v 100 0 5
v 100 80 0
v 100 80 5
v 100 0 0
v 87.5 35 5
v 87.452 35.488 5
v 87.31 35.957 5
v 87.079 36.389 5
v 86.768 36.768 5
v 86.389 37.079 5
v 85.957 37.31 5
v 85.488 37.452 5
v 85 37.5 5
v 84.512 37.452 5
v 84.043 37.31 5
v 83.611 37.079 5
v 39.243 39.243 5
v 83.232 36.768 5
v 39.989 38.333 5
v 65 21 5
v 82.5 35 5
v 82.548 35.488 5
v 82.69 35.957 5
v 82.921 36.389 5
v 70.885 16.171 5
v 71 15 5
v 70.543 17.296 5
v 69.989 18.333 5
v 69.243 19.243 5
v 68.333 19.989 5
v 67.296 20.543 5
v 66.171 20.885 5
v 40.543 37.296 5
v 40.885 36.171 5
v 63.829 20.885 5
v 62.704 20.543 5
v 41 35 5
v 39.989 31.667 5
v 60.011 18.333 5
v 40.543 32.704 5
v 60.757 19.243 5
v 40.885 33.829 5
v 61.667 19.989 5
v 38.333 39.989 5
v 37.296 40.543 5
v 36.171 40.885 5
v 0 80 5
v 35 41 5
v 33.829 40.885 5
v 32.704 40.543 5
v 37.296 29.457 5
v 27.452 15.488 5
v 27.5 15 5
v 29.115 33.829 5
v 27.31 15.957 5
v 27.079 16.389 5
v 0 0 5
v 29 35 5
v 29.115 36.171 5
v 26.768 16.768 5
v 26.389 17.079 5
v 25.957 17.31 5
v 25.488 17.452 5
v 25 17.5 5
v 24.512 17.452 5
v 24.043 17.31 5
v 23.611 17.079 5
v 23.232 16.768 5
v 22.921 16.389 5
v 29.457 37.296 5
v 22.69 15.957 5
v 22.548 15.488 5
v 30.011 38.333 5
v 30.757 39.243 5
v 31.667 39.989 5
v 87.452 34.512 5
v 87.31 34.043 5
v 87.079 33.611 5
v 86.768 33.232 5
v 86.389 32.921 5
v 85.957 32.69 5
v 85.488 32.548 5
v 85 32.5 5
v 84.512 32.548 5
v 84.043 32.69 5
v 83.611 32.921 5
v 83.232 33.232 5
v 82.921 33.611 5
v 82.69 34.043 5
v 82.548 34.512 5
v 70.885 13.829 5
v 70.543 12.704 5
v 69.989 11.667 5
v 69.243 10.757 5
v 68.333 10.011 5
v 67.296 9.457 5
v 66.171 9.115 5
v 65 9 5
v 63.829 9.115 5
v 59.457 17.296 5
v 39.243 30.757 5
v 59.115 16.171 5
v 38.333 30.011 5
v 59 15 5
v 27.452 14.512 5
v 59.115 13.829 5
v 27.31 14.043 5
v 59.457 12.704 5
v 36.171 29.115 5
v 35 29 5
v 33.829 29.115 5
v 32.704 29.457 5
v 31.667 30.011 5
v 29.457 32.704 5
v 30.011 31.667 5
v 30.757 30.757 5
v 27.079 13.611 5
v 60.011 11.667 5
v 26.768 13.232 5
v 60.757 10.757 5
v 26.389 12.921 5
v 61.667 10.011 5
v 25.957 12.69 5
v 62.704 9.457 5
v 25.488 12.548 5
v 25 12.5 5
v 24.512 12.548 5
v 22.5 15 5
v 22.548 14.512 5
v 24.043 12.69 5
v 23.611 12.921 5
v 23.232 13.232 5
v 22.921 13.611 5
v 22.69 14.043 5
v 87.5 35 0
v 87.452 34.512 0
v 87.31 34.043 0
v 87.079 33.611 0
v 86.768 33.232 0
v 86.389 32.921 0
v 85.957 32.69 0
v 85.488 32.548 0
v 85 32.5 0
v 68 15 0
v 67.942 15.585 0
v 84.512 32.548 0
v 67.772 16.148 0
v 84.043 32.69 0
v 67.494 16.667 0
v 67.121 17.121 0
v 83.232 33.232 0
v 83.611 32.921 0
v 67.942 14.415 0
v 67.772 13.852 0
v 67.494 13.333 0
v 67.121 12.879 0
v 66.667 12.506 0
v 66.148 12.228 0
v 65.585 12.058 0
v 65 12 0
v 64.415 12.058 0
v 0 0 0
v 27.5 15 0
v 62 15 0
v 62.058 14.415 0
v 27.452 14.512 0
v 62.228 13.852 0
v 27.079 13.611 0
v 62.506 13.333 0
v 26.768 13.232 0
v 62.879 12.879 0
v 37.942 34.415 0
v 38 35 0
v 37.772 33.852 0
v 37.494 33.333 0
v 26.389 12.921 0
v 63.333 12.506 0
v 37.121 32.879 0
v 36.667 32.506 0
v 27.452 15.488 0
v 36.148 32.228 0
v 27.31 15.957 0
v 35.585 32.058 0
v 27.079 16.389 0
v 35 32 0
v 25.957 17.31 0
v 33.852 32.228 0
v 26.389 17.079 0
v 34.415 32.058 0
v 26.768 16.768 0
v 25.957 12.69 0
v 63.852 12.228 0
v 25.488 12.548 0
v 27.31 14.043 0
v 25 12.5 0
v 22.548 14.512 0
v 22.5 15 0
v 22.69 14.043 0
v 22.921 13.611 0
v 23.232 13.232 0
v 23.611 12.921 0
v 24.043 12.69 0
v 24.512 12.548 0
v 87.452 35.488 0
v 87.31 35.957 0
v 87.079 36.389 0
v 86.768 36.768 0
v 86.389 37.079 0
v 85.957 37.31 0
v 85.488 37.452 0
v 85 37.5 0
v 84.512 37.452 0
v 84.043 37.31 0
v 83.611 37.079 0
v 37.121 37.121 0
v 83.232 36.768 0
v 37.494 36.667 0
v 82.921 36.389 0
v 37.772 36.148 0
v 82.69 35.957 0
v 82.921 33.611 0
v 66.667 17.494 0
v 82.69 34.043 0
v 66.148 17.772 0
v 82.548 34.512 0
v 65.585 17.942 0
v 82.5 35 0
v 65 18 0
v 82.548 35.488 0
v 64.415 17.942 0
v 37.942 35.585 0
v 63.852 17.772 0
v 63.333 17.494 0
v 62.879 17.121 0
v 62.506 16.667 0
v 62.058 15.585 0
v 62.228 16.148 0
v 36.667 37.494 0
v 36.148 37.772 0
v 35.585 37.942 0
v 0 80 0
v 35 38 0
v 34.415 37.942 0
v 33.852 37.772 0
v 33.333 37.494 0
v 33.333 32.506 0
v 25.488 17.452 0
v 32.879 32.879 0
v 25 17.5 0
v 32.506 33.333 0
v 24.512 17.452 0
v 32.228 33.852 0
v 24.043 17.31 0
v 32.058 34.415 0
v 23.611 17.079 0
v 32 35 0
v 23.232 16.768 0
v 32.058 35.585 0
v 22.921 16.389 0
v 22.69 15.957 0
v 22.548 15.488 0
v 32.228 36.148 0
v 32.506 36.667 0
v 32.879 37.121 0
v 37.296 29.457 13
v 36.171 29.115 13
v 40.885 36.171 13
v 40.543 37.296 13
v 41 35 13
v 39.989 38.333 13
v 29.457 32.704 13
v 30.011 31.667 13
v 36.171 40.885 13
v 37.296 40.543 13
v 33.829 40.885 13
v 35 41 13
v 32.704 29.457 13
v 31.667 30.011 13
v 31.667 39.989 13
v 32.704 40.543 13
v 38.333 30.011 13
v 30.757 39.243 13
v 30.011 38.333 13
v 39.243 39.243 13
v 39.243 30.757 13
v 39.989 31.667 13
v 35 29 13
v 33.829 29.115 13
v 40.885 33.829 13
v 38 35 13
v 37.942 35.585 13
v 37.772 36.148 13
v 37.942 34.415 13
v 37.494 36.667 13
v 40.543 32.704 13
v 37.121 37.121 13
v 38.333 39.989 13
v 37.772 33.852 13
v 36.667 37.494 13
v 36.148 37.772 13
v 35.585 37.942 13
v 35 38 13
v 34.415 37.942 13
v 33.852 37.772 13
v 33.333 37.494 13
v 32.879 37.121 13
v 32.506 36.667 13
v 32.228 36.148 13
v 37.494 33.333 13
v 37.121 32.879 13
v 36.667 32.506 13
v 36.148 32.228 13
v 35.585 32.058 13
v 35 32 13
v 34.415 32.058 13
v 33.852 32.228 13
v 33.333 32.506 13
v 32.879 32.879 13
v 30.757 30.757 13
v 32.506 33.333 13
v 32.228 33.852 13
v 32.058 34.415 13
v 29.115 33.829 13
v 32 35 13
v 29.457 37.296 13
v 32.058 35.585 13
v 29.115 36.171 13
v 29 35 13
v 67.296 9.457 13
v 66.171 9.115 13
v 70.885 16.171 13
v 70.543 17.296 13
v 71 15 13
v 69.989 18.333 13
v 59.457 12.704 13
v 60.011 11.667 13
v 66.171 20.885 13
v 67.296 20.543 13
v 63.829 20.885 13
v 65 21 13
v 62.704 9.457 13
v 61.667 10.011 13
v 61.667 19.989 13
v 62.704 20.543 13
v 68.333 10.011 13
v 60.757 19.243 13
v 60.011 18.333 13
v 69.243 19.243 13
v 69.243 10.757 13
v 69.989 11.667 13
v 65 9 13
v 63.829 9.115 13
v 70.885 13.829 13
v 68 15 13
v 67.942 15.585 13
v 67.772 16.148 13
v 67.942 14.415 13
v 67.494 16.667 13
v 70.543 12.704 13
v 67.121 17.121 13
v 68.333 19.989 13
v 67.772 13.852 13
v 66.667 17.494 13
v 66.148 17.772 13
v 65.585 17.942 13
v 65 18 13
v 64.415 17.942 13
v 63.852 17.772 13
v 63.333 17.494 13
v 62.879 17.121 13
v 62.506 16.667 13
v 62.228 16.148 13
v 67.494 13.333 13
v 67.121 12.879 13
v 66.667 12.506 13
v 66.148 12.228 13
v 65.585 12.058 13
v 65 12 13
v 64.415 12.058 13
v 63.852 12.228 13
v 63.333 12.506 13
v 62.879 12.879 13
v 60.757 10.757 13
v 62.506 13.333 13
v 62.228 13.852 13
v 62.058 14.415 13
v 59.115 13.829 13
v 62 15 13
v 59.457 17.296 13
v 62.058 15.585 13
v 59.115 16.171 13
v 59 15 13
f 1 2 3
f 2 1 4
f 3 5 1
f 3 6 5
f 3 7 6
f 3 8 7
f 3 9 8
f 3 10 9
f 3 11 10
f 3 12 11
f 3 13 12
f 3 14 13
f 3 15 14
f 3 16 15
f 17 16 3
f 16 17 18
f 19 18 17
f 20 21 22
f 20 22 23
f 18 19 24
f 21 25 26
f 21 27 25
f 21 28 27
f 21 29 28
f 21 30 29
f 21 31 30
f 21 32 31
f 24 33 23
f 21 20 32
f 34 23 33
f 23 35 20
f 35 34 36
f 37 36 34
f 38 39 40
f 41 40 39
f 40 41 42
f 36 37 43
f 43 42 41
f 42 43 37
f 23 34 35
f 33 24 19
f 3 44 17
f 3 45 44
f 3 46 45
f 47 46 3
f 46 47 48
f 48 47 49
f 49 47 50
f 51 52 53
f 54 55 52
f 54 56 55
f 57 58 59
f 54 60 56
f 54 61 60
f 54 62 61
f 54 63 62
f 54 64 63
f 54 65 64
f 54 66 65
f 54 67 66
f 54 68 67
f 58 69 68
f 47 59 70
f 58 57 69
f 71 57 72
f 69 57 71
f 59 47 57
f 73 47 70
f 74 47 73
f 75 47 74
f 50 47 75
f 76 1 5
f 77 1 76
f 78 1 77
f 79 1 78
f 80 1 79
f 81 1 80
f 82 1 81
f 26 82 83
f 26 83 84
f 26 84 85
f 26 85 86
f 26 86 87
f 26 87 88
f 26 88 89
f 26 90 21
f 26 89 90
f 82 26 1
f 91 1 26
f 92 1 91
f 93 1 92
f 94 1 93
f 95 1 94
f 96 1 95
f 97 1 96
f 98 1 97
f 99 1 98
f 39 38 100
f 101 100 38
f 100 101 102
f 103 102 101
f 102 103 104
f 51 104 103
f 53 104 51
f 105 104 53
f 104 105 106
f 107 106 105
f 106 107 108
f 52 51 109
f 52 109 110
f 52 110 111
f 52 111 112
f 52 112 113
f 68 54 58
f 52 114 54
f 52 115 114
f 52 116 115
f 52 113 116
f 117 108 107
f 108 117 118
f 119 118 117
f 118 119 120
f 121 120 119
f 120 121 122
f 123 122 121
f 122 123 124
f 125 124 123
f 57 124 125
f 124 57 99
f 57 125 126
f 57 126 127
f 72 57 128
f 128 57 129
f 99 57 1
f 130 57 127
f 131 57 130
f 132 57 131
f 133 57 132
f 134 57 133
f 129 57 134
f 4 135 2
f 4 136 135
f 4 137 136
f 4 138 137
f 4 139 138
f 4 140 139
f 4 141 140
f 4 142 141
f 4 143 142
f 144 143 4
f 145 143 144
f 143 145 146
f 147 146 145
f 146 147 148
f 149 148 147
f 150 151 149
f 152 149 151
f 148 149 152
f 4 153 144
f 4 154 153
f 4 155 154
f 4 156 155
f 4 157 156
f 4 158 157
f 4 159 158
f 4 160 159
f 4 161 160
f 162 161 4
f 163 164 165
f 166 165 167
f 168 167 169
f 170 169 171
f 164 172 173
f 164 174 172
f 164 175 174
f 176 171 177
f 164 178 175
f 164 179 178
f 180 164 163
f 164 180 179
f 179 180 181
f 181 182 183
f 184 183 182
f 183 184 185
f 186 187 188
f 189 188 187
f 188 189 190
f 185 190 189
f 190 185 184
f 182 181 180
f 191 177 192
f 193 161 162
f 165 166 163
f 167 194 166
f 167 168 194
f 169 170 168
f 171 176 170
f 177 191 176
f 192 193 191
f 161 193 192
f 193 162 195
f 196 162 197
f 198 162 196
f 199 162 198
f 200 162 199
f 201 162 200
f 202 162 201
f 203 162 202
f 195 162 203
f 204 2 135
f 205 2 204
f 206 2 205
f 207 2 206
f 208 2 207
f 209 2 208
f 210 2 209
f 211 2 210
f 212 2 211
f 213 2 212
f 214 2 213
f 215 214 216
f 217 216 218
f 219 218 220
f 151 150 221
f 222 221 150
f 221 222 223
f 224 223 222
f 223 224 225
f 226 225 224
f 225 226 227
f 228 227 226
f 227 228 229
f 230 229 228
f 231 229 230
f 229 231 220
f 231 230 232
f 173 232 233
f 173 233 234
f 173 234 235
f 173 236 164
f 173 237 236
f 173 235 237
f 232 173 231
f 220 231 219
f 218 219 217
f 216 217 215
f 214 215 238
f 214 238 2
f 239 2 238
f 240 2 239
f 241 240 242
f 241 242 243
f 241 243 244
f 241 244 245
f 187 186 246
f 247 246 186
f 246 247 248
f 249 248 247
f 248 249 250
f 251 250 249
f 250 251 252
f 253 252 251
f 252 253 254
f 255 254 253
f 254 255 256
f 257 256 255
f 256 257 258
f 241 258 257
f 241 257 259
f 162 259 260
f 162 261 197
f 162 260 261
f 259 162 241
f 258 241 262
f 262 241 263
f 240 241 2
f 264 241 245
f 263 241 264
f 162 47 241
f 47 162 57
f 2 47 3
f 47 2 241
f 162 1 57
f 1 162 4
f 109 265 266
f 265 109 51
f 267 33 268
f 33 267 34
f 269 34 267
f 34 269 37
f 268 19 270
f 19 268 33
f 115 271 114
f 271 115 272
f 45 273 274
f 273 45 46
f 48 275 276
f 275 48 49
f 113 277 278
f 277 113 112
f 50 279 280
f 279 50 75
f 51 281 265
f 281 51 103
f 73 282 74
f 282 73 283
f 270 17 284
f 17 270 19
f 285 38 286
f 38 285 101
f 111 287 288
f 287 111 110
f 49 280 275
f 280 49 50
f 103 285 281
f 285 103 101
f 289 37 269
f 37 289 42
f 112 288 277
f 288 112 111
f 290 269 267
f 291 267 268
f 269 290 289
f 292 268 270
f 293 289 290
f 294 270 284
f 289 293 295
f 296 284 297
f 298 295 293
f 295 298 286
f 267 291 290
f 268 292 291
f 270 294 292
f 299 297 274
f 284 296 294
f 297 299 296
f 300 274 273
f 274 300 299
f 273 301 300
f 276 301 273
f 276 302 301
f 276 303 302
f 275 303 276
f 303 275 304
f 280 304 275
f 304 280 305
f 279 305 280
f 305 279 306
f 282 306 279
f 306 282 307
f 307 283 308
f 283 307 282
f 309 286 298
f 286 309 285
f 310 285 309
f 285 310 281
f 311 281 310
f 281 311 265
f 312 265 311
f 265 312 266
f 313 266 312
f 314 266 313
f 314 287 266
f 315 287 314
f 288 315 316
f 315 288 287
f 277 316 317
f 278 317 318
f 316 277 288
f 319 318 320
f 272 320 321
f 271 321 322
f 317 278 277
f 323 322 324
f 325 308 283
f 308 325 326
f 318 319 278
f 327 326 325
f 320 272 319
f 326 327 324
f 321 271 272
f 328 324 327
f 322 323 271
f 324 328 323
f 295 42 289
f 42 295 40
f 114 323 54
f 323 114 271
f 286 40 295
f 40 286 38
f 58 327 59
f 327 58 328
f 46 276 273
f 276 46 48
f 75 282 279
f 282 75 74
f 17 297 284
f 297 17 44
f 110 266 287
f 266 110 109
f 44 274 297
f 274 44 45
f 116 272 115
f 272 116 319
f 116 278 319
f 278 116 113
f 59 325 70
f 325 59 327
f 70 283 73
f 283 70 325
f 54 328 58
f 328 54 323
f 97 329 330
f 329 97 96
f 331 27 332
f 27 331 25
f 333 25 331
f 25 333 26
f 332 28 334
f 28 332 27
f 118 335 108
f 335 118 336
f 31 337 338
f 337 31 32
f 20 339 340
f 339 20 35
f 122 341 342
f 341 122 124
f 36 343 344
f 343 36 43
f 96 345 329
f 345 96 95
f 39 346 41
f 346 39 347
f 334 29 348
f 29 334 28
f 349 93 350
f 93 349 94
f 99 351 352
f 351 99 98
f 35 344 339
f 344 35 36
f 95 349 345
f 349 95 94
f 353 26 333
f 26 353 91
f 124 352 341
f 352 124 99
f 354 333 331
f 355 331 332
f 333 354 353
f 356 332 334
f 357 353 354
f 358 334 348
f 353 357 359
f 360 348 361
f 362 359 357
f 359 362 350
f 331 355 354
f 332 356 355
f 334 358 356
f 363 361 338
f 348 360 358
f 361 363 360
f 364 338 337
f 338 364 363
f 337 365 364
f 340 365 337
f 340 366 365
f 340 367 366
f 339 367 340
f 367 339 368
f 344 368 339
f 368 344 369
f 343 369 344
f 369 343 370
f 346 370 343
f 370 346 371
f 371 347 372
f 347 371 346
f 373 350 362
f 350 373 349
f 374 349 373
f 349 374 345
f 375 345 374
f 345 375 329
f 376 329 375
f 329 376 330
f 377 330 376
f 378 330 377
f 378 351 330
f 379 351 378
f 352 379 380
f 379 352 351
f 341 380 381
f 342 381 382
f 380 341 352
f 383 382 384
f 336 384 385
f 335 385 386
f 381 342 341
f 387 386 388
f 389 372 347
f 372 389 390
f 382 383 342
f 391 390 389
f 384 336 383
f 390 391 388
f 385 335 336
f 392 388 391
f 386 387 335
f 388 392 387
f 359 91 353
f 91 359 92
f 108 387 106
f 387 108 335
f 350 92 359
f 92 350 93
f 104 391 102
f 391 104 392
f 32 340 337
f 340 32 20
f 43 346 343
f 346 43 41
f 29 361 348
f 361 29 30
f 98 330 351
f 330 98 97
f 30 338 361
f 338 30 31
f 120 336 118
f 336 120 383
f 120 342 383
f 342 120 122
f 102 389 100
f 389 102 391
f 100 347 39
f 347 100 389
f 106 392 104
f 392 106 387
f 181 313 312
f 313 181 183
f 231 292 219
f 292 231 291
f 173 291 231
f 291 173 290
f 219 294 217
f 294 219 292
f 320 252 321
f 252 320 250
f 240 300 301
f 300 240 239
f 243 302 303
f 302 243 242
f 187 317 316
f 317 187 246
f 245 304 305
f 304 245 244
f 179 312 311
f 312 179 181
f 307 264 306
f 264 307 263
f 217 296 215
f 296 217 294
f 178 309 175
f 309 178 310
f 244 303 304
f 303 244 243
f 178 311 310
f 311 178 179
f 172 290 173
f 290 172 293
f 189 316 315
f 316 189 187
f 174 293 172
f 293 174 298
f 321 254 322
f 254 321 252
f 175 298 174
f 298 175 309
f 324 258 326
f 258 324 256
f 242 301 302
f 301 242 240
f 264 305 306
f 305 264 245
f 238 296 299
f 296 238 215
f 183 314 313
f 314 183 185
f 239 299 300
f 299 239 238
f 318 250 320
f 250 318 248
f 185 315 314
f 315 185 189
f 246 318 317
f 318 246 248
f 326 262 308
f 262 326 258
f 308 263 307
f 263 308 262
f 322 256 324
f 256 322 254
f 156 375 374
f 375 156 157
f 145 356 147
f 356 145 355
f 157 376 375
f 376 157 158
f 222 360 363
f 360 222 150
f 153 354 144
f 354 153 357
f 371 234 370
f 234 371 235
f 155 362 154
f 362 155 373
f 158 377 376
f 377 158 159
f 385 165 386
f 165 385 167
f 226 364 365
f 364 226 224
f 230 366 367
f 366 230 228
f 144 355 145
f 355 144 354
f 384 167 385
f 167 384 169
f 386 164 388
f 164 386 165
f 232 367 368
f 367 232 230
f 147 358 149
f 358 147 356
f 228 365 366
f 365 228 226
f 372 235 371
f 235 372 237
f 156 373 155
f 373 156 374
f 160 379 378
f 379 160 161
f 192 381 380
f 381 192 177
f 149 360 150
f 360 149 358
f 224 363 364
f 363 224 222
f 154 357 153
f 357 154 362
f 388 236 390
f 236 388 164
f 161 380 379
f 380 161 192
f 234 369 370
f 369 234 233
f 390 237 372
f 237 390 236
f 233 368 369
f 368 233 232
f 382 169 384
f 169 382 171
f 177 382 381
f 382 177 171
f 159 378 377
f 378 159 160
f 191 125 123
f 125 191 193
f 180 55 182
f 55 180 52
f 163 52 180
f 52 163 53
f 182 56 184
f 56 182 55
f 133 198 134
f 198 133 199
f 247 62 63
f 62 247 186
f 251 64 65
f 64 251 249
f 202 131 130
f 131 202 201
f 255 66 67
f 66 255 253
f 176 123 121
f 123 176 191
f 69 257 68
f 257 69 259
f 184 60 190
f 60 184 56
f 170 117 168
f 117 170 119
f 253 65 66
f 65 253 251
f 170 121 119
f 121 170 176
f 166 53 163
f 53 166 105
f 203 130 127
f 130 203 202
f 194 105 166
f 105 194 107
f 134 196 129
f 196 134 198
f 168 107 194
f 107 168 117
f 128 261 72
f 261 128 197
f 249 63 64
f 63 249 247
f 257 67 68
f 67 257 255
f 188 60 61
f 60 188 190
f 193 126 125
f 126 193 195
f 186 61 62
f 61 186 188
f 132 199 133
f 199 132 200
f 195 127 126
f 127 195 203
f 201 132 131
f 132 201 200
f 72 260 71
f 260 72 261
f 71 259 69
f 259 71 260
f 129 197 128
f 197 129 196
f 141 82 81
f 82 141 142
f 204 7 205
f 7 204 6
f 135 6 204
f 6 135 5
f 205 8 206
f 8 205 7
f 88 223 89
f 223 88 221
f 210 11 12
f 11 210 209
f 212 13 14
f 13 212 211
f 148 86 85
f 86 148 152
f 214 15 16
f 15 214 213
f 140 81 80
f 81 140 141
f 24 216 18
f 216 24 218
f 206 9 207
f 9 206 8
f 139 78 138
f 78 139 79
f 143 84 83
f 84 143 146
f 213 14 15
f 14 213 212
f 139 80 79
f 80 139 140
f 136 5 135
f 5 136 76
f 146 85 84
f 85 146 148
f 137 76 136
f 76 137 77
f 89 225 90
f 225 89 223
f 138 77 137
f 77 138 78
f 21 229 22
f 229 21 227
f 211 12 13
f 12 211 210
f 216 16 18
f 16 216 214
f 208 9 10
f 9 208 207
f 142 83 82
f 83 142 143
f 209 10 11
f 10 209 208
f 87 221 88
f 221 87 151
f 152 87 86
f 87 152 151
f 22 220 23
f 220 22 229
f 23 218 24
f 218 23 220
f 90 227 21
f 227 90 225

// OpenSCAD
$fn = 32;

// ----------------------------------------------------------------------
// Mixed field: bosses and holes at given coordinates
// ----------------------------------------------------------------------

// --- parameters (mm) ---
plate_l = 100;            // plate length, X
plate_w = 80;             // plate width, Y
plate_t = 5;              // plate thickness, Z
boss_d = 12;              // boss diameter
boss_h = 8;               // boss height above the plate
hole_d = 5;               // through hole diameter

total_h = plate_t + boss_h;  // overall height

difference() {
  union() {
    cube([plate_l, plate_w, plate_t]);
    translate([35, 35, plate_t]) cylinder(h = boss_h, d = boss_d);
    translate([65, 15, plate_t]) cylinder(h = boss_h, d = boss_d);
  }
  translate([35, 35, -1]) cylinder(h = total_h + 2, d = boss_d / 2);
  translate([65, 15, -1]) cylinder(h = total_h + 2, d = boss_d / 2);
  translate([25, 15, -1]) cylinder(h = plate_t + 2, d = hole_d);
  translate([85, 35, -1]) cylinder(h = plate_t + 2, d = hole_d);
}
